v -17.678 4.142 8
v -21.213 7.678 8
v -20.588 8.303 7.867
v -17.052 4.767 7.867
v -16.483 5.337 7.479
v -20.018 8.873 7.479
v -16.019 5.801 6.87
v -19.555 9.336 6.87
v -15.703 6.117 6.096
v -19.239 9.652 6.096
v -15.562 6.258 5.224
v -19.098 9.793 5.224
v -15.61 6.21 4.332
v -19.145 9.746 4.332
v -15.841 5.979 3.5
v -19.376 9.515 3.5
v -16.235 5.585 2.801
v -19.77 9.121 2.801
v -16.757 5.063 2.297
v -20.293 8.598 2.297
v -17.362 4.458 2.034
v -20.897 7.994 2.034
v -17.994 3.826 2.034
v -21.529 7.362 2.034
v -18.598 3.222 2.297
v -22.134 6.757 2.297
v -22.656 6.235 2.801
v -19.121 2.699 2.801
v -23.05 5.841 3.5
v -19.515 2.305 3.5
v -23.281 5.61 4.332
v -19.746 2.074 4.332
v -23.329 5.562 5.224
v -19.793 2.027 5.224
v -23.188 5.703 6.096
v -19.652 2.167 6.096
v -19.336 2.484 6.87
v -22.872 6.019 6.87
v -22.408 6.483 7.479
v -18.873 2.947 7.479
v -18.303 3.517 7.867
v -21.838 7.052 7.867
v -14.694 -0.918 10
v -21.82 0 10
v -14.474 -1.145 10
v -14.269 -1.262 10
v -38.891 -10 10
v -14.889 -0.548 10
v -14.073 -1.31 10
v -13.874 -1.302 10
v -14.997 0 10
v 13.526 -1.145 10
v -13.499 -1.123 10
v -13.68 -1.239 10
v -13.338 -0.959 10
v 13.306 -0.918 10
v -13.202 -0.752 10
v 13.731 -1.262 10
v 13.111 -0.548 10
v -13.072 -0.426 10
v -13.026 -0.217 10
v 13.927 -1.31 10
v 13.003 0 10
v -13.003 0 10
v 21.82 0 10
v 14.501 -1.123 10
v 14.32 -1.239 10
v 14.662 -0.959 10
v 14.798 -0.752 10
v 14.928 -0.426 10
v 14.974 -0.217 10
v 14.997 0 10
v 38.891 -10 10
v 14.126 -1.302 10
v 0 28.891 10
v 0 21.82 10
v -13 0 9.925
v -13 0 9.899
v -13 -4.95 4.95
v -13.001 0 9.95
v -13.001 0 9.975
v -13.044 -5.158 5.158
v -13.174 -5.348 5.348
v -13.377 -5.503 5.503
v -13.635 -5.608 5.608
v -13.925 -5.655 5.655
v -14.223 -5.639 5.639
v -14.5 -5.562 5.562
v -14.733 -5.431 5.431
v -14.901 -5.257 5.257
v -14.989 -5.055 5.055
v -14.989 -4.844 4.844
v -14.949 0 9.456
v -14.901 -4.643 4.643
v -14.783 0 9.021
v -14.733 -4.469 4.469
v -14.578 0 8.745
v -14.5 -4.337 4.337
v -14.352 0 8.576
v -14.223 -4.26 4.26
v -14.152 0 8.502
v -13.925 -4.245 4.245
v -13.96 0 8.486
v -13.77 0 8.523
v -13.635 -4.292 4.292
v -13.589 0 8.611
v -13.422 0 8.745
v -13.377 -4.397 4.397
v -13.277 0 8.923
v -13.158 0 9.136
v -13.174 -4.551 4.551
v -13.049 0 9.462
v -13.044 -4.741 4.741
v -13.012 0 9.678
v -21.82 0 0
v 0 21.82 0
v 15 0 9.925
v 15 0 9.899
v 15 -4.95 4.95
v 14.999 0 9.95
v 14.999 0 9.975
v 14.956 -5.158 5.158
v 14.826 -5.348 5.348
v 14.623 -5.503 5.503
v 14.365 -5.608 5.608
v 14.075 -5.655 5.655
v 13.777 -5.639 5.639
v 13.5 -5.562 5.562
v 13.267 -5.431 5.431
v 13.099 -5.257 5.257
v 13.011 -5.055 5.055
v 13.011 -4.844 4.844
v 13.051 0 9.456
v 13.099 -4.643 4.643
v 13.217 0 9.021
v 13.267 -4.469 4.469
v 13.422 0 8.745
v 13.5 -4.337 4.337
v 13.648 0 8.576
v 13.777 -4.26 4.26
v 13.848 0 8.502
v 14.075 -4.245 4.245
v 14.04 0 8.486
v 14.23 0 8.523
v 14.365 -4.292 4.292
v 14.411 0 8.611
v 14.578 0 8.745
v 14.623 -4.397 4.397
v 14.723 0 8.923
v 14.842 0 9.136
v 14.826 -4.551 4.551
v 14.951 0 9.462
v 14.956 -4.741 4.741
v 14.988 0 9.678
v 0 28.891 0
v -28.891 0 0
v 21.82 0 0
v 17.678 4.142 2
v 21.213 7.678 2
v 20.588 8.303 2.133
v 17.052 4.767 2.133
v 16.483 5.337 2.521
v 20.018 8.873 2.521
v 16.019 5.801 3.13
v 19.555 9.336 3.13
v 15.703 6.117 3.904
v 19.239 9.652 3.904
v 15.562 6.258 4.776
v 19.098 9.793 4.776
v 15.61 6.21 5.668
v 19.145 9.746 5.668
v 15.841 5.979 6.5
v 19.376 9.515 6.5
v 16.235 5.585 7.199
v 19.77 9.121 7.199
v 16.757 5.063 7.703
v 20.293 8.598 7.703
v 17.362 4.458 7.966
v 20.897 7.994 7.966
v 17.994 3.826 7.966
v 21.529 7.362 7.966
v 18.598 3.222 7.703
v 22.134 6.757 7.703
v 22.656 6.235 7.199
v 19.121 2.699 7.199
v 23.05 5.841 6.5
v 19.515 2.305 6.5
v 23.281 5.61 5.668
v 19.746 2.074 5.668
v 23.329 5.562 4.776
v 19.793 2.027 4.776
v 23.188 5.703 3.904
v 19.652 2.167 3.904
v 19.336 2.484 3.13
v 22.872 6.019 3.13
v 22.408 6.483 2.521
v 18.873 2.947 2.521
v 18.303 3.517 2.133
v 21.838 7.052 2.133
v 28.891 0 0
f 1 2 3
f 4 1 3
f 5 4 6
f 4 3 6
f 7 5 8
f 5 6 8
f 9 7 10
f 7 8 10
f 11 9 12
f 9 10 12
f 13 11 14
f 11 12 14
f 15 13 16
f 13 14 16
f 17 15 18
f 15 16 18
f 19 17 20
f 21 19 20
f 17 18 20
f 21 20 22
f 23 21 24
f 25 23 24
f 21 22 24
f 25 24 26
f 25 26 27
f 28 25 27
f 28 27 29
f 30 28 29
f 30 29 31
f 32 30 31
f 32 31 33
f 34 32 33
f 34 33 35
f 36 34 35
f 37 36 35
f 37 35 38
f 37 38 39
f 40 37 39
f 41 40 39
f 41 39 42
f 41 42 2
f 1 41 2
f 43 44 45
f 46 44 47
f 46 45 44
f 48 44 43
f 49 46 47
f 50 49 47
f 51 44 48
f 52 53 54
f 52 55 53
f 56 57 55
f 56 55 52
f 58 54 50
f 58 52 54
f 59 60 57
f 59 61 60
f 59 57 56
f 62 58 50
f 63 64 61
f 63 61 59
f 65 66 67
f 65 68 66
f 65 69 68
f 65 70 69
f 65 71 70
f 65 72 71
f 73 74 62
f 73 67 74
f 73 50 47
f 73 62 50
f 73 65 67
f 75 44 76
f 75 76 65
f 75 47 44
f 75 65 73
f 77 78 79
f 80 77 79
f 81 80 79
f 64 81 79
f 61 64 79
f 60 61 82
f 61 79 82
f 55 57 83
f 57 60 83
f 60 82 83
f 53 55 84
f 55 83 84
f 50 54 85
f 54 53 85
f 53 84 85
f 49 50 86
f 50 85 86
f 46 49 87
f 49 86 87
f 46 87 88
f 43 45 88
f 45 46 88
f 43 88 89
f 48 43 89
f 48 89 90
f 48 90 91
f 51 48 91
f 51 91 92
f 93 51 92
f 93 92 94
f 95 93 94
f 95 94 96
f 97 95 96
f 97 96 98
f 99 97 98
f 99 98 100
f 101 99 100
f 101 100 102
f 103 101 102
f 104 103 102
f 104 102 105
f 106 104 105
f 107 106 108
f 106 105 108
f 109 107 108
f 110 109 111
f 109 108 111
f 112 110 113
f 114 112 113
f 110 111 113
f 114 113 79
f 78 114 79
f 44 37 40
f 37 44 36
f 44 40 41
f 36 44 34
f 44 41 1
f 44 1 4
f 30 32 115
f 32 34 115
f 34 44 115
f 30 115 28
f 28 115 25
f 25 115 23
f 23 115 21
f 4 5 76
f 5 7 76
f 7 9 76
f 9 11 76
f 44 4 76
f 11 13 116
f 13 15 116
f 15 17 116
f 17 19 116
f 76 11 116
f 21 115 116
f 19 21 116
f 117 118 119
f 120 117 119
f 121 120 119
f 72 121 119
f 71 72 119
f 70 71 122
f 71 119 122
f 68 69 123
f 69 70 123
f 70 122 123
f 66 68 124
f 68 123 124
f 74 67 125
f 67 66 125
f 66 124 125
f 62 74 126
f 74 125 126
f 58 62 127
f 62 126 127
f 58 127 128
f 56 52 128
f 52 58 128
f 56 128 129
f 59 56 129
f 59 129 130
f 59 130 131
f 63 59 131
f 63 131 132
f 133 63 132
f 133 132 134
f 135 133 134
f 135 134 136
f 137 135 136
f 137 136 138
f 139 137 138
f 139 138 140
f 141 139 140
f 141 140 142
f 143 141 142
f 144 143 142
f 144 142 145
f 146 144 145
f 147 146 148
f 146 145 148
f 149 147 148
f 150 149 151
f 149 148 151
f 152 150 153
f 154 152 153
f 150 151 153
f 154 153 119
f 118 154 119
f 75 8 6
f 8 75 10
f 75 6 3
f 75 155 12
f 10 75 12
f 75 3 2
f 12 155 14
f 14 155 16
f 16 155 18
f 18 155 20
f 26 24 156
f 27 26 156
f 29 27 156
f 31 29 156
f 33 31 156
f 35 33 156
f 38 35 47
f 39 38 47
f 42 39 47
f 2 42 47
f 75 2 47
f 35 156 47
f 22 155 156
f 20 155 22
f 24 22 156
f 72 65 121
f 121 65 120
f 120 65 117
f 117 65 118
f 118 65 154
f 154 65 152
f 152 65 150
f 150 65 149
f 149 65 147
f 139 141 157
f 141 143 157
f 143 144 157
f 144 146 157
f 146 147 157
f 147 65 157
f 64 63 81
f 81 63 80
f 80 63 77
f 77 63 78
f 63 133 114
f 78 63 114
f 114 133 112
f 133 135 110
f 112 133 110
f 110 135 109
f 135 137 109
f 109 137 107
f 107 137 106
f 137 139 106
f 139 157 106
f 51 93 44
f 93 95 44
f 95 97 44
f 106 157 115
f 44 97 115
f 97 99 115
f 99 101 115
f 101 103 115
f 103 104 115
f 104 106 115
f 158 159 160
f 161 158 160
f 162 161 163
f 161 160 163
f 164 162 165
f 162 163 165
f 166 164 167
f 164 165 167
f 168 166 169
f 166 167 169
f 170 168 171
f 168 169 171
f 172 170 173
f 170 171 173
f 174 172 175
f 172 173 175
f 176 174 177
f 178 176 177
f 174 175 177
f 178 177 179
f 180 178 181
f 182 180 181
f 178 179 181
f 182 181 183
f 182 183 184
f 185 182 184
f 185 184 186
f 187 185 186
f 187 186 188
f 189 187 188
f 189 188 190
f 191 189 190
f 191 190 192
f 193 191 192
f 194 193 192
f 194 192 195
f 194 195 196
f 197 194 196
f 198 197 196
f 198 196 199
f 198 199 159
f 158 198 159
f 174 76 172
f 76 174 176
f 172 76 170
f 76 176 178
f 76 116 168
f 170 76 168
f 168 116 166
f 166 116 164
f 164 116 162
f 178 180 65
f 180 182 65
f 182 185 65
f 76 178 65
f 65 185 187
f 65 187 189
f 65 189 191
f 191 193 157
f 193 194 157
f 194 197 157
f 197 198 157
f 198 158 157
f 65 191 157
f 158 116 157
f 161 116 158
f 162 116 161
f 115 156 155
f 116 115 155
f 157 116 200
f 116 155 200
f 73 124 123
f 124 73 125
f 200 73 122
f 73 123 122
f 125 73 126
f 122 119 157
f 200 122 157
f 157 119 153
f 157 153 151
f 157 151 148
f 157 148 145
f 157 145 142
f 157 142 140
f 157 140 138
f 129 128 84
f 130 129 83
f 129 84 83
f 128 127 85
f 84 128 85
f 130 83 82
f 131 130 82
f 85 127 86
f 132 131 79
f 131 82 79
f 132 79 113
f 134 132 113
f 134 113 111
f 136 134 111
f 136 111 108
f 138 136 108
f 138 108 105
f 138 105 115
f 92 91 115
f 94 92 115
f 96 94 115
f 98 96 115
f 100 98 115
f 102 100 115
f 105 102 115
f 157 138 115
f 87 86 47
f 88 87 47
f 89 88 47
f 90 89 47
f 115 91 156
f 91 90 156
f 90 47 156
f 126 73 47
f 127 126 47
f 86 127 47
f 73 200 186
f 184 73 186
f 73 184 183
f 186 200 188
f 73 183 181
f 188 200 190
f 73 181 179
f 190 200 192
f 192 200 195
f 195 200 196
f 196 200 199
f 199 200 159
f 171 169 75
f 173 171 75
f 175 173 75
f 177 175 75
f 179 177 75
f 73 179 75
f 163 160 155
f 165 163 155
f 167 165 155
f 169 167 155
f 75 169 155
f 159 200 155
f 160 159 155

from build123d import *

# Parameters (mm, degrees)
BOSS_EXTRUDE4_DEPTH     = 10
CUT_EXTRUDE2_DEPTH      = 39.890872965
CUT_EXTRUDE2_DEPTH_BACK = 39.890872965
CUT_EXTRUDE3_REACH      = 57
SKETCH7_R               = 3
CUT_EXTRUDE4_REACH      = 57
SKETCH8_R               = 3
CUT_EXTRUDE5_REACH      = 29.5
SKETCH9_R               = 1


with BuildPart() as part:
    # Sketch4 → Boss-Extrude4 (new body)
    with BuildSketch(Plane.XY):
        Polygon((38.890872965, -10), (0, 28.890872965), (-38.890872965, -10), align=None)
        Polygon((0, 21.819805153), (21.819805153, 0), (14.748737342, 0), (-14.748737342, 0), (-21.819805153, 0), align=None, mode=Mode.SUBTRACT)
    extrude(amount=BOSS_EXTRUDE4_DEPTH)

    # Sketch6 → Cut-Extrude2 (cut, two sides)
    with BuildSketch(Plane(origin=(0, 0, 0), x_dir=(0, 0, -1), z_dir=(1, 0, 0))) as cut_extrude2_sk:
        Polygon((-10, -10), (0, 0), (0, -10), align=None)
    extrude(amount=CUT_EXTRUDE2_DEPTH, mode=Mode.SUBTRACT)
    extrude(cut_extrude2_sk.sketch, amount=-CUT_EXTRUDE2_DEPTH_BACK, mode=Mode.SUBTRACT)

    # Sketch7 → Cut-Extrude3 (cut, up to next)
    with BuildSketch(Plane(origin=(-14.445436483, 14.445436483, 0), x_dir=(0, 0, 1), z_dir=(-0.707106781, 0.707106781, 0)), mode=Mode.PRIVATE) as cut_extrude3_sk1:
        with Locations((5, -9.571067812)):
            Circle(SKETCH7_R)
    cut_extrude3_tool1 = extrude(cut_extrude3_sk1.sketch, amount=-CUT_EXTRUDE3_REACH, mode=Mode.PRIVATE) & part.part
    add(cut_extrude3_tool1.solids().sort_by_distance((-21.213203, 7.67767, 5))[0], mode=Mode.SUBTRACT)

    # Sketch8 → Cut-Extrude4 (cut, up to next)
    with BuildSketch(Plane(origin=(14.445436483, 14.445436483, 0), x_dir=(0, 0, -1), z_dir=(0.707106781, 0.707106781, 0)), mode=Mode.PRIVATE) as cut_extrude4_sk1:
        with Locations((-5, -9.571067812)):
            Circle(SKETCH8_R)
    cut_extrude4_tool1 = extrude(cut_extrude4_sk1.sketch, amount=-CUT_EXTRUDE4_REACH, mode=Mode.PRIVATE) & part.part
    add(cut_extrude4_tool1.solids().sort_by_distance((21.213203, 7.67767, 5))[0], mode=Mode.SUBTRACT)

    # Sketch9 → Cut-Extrude5 (cut, up to next)
    with BuildSketch(Plane(origin=(0, 0, 0), x_dir=(1, 0, 0), z_dir=(0, -0.707106781, -0.707106781)), mode=Mode.PRIVATE) as cut_extrude5_sk1:
        with Locations((-14, 7)):
            Circle(SKETCH9_R)
    cut_extrude5_tool1 = extrude(cut_extrude5_sk1.sketch, amount=-CUT_EXTRUDE5_REACH, mode=Mode.PRIVATE) & part.part
    add(cut_extrude5_tool1.solids().sort_by_distance((-14, -4.949747, 4.949747))[0], mode=Mode.SUBTRACT)
    # Sketch9 → Cut-Extrude5 (cut, up to next)
    with BuildSketch(Plane(origin=(0, 0, 0), x_dir=(1, 0, 0), z_dir=(0, -0.707106781, -0.707106781)), mode=Mode.PRIVATE) as cut_extrude5_sk2:
        with Locations((14, 7)):
            Circle(SKETCH9_R)
    cut_extrude5_tool2 = extrude(cut_extrude5_sk2.sketch, amount=-CUT_EXTRUDE5_REACH, mode=Mode.PRIVATE) & part.part
    add(cut_extrude5_tool2.solids().sort_by_distance((14, -4.949747, 4.949747))[0], mode=Mode.SUBTRACT)


solid = part.part
